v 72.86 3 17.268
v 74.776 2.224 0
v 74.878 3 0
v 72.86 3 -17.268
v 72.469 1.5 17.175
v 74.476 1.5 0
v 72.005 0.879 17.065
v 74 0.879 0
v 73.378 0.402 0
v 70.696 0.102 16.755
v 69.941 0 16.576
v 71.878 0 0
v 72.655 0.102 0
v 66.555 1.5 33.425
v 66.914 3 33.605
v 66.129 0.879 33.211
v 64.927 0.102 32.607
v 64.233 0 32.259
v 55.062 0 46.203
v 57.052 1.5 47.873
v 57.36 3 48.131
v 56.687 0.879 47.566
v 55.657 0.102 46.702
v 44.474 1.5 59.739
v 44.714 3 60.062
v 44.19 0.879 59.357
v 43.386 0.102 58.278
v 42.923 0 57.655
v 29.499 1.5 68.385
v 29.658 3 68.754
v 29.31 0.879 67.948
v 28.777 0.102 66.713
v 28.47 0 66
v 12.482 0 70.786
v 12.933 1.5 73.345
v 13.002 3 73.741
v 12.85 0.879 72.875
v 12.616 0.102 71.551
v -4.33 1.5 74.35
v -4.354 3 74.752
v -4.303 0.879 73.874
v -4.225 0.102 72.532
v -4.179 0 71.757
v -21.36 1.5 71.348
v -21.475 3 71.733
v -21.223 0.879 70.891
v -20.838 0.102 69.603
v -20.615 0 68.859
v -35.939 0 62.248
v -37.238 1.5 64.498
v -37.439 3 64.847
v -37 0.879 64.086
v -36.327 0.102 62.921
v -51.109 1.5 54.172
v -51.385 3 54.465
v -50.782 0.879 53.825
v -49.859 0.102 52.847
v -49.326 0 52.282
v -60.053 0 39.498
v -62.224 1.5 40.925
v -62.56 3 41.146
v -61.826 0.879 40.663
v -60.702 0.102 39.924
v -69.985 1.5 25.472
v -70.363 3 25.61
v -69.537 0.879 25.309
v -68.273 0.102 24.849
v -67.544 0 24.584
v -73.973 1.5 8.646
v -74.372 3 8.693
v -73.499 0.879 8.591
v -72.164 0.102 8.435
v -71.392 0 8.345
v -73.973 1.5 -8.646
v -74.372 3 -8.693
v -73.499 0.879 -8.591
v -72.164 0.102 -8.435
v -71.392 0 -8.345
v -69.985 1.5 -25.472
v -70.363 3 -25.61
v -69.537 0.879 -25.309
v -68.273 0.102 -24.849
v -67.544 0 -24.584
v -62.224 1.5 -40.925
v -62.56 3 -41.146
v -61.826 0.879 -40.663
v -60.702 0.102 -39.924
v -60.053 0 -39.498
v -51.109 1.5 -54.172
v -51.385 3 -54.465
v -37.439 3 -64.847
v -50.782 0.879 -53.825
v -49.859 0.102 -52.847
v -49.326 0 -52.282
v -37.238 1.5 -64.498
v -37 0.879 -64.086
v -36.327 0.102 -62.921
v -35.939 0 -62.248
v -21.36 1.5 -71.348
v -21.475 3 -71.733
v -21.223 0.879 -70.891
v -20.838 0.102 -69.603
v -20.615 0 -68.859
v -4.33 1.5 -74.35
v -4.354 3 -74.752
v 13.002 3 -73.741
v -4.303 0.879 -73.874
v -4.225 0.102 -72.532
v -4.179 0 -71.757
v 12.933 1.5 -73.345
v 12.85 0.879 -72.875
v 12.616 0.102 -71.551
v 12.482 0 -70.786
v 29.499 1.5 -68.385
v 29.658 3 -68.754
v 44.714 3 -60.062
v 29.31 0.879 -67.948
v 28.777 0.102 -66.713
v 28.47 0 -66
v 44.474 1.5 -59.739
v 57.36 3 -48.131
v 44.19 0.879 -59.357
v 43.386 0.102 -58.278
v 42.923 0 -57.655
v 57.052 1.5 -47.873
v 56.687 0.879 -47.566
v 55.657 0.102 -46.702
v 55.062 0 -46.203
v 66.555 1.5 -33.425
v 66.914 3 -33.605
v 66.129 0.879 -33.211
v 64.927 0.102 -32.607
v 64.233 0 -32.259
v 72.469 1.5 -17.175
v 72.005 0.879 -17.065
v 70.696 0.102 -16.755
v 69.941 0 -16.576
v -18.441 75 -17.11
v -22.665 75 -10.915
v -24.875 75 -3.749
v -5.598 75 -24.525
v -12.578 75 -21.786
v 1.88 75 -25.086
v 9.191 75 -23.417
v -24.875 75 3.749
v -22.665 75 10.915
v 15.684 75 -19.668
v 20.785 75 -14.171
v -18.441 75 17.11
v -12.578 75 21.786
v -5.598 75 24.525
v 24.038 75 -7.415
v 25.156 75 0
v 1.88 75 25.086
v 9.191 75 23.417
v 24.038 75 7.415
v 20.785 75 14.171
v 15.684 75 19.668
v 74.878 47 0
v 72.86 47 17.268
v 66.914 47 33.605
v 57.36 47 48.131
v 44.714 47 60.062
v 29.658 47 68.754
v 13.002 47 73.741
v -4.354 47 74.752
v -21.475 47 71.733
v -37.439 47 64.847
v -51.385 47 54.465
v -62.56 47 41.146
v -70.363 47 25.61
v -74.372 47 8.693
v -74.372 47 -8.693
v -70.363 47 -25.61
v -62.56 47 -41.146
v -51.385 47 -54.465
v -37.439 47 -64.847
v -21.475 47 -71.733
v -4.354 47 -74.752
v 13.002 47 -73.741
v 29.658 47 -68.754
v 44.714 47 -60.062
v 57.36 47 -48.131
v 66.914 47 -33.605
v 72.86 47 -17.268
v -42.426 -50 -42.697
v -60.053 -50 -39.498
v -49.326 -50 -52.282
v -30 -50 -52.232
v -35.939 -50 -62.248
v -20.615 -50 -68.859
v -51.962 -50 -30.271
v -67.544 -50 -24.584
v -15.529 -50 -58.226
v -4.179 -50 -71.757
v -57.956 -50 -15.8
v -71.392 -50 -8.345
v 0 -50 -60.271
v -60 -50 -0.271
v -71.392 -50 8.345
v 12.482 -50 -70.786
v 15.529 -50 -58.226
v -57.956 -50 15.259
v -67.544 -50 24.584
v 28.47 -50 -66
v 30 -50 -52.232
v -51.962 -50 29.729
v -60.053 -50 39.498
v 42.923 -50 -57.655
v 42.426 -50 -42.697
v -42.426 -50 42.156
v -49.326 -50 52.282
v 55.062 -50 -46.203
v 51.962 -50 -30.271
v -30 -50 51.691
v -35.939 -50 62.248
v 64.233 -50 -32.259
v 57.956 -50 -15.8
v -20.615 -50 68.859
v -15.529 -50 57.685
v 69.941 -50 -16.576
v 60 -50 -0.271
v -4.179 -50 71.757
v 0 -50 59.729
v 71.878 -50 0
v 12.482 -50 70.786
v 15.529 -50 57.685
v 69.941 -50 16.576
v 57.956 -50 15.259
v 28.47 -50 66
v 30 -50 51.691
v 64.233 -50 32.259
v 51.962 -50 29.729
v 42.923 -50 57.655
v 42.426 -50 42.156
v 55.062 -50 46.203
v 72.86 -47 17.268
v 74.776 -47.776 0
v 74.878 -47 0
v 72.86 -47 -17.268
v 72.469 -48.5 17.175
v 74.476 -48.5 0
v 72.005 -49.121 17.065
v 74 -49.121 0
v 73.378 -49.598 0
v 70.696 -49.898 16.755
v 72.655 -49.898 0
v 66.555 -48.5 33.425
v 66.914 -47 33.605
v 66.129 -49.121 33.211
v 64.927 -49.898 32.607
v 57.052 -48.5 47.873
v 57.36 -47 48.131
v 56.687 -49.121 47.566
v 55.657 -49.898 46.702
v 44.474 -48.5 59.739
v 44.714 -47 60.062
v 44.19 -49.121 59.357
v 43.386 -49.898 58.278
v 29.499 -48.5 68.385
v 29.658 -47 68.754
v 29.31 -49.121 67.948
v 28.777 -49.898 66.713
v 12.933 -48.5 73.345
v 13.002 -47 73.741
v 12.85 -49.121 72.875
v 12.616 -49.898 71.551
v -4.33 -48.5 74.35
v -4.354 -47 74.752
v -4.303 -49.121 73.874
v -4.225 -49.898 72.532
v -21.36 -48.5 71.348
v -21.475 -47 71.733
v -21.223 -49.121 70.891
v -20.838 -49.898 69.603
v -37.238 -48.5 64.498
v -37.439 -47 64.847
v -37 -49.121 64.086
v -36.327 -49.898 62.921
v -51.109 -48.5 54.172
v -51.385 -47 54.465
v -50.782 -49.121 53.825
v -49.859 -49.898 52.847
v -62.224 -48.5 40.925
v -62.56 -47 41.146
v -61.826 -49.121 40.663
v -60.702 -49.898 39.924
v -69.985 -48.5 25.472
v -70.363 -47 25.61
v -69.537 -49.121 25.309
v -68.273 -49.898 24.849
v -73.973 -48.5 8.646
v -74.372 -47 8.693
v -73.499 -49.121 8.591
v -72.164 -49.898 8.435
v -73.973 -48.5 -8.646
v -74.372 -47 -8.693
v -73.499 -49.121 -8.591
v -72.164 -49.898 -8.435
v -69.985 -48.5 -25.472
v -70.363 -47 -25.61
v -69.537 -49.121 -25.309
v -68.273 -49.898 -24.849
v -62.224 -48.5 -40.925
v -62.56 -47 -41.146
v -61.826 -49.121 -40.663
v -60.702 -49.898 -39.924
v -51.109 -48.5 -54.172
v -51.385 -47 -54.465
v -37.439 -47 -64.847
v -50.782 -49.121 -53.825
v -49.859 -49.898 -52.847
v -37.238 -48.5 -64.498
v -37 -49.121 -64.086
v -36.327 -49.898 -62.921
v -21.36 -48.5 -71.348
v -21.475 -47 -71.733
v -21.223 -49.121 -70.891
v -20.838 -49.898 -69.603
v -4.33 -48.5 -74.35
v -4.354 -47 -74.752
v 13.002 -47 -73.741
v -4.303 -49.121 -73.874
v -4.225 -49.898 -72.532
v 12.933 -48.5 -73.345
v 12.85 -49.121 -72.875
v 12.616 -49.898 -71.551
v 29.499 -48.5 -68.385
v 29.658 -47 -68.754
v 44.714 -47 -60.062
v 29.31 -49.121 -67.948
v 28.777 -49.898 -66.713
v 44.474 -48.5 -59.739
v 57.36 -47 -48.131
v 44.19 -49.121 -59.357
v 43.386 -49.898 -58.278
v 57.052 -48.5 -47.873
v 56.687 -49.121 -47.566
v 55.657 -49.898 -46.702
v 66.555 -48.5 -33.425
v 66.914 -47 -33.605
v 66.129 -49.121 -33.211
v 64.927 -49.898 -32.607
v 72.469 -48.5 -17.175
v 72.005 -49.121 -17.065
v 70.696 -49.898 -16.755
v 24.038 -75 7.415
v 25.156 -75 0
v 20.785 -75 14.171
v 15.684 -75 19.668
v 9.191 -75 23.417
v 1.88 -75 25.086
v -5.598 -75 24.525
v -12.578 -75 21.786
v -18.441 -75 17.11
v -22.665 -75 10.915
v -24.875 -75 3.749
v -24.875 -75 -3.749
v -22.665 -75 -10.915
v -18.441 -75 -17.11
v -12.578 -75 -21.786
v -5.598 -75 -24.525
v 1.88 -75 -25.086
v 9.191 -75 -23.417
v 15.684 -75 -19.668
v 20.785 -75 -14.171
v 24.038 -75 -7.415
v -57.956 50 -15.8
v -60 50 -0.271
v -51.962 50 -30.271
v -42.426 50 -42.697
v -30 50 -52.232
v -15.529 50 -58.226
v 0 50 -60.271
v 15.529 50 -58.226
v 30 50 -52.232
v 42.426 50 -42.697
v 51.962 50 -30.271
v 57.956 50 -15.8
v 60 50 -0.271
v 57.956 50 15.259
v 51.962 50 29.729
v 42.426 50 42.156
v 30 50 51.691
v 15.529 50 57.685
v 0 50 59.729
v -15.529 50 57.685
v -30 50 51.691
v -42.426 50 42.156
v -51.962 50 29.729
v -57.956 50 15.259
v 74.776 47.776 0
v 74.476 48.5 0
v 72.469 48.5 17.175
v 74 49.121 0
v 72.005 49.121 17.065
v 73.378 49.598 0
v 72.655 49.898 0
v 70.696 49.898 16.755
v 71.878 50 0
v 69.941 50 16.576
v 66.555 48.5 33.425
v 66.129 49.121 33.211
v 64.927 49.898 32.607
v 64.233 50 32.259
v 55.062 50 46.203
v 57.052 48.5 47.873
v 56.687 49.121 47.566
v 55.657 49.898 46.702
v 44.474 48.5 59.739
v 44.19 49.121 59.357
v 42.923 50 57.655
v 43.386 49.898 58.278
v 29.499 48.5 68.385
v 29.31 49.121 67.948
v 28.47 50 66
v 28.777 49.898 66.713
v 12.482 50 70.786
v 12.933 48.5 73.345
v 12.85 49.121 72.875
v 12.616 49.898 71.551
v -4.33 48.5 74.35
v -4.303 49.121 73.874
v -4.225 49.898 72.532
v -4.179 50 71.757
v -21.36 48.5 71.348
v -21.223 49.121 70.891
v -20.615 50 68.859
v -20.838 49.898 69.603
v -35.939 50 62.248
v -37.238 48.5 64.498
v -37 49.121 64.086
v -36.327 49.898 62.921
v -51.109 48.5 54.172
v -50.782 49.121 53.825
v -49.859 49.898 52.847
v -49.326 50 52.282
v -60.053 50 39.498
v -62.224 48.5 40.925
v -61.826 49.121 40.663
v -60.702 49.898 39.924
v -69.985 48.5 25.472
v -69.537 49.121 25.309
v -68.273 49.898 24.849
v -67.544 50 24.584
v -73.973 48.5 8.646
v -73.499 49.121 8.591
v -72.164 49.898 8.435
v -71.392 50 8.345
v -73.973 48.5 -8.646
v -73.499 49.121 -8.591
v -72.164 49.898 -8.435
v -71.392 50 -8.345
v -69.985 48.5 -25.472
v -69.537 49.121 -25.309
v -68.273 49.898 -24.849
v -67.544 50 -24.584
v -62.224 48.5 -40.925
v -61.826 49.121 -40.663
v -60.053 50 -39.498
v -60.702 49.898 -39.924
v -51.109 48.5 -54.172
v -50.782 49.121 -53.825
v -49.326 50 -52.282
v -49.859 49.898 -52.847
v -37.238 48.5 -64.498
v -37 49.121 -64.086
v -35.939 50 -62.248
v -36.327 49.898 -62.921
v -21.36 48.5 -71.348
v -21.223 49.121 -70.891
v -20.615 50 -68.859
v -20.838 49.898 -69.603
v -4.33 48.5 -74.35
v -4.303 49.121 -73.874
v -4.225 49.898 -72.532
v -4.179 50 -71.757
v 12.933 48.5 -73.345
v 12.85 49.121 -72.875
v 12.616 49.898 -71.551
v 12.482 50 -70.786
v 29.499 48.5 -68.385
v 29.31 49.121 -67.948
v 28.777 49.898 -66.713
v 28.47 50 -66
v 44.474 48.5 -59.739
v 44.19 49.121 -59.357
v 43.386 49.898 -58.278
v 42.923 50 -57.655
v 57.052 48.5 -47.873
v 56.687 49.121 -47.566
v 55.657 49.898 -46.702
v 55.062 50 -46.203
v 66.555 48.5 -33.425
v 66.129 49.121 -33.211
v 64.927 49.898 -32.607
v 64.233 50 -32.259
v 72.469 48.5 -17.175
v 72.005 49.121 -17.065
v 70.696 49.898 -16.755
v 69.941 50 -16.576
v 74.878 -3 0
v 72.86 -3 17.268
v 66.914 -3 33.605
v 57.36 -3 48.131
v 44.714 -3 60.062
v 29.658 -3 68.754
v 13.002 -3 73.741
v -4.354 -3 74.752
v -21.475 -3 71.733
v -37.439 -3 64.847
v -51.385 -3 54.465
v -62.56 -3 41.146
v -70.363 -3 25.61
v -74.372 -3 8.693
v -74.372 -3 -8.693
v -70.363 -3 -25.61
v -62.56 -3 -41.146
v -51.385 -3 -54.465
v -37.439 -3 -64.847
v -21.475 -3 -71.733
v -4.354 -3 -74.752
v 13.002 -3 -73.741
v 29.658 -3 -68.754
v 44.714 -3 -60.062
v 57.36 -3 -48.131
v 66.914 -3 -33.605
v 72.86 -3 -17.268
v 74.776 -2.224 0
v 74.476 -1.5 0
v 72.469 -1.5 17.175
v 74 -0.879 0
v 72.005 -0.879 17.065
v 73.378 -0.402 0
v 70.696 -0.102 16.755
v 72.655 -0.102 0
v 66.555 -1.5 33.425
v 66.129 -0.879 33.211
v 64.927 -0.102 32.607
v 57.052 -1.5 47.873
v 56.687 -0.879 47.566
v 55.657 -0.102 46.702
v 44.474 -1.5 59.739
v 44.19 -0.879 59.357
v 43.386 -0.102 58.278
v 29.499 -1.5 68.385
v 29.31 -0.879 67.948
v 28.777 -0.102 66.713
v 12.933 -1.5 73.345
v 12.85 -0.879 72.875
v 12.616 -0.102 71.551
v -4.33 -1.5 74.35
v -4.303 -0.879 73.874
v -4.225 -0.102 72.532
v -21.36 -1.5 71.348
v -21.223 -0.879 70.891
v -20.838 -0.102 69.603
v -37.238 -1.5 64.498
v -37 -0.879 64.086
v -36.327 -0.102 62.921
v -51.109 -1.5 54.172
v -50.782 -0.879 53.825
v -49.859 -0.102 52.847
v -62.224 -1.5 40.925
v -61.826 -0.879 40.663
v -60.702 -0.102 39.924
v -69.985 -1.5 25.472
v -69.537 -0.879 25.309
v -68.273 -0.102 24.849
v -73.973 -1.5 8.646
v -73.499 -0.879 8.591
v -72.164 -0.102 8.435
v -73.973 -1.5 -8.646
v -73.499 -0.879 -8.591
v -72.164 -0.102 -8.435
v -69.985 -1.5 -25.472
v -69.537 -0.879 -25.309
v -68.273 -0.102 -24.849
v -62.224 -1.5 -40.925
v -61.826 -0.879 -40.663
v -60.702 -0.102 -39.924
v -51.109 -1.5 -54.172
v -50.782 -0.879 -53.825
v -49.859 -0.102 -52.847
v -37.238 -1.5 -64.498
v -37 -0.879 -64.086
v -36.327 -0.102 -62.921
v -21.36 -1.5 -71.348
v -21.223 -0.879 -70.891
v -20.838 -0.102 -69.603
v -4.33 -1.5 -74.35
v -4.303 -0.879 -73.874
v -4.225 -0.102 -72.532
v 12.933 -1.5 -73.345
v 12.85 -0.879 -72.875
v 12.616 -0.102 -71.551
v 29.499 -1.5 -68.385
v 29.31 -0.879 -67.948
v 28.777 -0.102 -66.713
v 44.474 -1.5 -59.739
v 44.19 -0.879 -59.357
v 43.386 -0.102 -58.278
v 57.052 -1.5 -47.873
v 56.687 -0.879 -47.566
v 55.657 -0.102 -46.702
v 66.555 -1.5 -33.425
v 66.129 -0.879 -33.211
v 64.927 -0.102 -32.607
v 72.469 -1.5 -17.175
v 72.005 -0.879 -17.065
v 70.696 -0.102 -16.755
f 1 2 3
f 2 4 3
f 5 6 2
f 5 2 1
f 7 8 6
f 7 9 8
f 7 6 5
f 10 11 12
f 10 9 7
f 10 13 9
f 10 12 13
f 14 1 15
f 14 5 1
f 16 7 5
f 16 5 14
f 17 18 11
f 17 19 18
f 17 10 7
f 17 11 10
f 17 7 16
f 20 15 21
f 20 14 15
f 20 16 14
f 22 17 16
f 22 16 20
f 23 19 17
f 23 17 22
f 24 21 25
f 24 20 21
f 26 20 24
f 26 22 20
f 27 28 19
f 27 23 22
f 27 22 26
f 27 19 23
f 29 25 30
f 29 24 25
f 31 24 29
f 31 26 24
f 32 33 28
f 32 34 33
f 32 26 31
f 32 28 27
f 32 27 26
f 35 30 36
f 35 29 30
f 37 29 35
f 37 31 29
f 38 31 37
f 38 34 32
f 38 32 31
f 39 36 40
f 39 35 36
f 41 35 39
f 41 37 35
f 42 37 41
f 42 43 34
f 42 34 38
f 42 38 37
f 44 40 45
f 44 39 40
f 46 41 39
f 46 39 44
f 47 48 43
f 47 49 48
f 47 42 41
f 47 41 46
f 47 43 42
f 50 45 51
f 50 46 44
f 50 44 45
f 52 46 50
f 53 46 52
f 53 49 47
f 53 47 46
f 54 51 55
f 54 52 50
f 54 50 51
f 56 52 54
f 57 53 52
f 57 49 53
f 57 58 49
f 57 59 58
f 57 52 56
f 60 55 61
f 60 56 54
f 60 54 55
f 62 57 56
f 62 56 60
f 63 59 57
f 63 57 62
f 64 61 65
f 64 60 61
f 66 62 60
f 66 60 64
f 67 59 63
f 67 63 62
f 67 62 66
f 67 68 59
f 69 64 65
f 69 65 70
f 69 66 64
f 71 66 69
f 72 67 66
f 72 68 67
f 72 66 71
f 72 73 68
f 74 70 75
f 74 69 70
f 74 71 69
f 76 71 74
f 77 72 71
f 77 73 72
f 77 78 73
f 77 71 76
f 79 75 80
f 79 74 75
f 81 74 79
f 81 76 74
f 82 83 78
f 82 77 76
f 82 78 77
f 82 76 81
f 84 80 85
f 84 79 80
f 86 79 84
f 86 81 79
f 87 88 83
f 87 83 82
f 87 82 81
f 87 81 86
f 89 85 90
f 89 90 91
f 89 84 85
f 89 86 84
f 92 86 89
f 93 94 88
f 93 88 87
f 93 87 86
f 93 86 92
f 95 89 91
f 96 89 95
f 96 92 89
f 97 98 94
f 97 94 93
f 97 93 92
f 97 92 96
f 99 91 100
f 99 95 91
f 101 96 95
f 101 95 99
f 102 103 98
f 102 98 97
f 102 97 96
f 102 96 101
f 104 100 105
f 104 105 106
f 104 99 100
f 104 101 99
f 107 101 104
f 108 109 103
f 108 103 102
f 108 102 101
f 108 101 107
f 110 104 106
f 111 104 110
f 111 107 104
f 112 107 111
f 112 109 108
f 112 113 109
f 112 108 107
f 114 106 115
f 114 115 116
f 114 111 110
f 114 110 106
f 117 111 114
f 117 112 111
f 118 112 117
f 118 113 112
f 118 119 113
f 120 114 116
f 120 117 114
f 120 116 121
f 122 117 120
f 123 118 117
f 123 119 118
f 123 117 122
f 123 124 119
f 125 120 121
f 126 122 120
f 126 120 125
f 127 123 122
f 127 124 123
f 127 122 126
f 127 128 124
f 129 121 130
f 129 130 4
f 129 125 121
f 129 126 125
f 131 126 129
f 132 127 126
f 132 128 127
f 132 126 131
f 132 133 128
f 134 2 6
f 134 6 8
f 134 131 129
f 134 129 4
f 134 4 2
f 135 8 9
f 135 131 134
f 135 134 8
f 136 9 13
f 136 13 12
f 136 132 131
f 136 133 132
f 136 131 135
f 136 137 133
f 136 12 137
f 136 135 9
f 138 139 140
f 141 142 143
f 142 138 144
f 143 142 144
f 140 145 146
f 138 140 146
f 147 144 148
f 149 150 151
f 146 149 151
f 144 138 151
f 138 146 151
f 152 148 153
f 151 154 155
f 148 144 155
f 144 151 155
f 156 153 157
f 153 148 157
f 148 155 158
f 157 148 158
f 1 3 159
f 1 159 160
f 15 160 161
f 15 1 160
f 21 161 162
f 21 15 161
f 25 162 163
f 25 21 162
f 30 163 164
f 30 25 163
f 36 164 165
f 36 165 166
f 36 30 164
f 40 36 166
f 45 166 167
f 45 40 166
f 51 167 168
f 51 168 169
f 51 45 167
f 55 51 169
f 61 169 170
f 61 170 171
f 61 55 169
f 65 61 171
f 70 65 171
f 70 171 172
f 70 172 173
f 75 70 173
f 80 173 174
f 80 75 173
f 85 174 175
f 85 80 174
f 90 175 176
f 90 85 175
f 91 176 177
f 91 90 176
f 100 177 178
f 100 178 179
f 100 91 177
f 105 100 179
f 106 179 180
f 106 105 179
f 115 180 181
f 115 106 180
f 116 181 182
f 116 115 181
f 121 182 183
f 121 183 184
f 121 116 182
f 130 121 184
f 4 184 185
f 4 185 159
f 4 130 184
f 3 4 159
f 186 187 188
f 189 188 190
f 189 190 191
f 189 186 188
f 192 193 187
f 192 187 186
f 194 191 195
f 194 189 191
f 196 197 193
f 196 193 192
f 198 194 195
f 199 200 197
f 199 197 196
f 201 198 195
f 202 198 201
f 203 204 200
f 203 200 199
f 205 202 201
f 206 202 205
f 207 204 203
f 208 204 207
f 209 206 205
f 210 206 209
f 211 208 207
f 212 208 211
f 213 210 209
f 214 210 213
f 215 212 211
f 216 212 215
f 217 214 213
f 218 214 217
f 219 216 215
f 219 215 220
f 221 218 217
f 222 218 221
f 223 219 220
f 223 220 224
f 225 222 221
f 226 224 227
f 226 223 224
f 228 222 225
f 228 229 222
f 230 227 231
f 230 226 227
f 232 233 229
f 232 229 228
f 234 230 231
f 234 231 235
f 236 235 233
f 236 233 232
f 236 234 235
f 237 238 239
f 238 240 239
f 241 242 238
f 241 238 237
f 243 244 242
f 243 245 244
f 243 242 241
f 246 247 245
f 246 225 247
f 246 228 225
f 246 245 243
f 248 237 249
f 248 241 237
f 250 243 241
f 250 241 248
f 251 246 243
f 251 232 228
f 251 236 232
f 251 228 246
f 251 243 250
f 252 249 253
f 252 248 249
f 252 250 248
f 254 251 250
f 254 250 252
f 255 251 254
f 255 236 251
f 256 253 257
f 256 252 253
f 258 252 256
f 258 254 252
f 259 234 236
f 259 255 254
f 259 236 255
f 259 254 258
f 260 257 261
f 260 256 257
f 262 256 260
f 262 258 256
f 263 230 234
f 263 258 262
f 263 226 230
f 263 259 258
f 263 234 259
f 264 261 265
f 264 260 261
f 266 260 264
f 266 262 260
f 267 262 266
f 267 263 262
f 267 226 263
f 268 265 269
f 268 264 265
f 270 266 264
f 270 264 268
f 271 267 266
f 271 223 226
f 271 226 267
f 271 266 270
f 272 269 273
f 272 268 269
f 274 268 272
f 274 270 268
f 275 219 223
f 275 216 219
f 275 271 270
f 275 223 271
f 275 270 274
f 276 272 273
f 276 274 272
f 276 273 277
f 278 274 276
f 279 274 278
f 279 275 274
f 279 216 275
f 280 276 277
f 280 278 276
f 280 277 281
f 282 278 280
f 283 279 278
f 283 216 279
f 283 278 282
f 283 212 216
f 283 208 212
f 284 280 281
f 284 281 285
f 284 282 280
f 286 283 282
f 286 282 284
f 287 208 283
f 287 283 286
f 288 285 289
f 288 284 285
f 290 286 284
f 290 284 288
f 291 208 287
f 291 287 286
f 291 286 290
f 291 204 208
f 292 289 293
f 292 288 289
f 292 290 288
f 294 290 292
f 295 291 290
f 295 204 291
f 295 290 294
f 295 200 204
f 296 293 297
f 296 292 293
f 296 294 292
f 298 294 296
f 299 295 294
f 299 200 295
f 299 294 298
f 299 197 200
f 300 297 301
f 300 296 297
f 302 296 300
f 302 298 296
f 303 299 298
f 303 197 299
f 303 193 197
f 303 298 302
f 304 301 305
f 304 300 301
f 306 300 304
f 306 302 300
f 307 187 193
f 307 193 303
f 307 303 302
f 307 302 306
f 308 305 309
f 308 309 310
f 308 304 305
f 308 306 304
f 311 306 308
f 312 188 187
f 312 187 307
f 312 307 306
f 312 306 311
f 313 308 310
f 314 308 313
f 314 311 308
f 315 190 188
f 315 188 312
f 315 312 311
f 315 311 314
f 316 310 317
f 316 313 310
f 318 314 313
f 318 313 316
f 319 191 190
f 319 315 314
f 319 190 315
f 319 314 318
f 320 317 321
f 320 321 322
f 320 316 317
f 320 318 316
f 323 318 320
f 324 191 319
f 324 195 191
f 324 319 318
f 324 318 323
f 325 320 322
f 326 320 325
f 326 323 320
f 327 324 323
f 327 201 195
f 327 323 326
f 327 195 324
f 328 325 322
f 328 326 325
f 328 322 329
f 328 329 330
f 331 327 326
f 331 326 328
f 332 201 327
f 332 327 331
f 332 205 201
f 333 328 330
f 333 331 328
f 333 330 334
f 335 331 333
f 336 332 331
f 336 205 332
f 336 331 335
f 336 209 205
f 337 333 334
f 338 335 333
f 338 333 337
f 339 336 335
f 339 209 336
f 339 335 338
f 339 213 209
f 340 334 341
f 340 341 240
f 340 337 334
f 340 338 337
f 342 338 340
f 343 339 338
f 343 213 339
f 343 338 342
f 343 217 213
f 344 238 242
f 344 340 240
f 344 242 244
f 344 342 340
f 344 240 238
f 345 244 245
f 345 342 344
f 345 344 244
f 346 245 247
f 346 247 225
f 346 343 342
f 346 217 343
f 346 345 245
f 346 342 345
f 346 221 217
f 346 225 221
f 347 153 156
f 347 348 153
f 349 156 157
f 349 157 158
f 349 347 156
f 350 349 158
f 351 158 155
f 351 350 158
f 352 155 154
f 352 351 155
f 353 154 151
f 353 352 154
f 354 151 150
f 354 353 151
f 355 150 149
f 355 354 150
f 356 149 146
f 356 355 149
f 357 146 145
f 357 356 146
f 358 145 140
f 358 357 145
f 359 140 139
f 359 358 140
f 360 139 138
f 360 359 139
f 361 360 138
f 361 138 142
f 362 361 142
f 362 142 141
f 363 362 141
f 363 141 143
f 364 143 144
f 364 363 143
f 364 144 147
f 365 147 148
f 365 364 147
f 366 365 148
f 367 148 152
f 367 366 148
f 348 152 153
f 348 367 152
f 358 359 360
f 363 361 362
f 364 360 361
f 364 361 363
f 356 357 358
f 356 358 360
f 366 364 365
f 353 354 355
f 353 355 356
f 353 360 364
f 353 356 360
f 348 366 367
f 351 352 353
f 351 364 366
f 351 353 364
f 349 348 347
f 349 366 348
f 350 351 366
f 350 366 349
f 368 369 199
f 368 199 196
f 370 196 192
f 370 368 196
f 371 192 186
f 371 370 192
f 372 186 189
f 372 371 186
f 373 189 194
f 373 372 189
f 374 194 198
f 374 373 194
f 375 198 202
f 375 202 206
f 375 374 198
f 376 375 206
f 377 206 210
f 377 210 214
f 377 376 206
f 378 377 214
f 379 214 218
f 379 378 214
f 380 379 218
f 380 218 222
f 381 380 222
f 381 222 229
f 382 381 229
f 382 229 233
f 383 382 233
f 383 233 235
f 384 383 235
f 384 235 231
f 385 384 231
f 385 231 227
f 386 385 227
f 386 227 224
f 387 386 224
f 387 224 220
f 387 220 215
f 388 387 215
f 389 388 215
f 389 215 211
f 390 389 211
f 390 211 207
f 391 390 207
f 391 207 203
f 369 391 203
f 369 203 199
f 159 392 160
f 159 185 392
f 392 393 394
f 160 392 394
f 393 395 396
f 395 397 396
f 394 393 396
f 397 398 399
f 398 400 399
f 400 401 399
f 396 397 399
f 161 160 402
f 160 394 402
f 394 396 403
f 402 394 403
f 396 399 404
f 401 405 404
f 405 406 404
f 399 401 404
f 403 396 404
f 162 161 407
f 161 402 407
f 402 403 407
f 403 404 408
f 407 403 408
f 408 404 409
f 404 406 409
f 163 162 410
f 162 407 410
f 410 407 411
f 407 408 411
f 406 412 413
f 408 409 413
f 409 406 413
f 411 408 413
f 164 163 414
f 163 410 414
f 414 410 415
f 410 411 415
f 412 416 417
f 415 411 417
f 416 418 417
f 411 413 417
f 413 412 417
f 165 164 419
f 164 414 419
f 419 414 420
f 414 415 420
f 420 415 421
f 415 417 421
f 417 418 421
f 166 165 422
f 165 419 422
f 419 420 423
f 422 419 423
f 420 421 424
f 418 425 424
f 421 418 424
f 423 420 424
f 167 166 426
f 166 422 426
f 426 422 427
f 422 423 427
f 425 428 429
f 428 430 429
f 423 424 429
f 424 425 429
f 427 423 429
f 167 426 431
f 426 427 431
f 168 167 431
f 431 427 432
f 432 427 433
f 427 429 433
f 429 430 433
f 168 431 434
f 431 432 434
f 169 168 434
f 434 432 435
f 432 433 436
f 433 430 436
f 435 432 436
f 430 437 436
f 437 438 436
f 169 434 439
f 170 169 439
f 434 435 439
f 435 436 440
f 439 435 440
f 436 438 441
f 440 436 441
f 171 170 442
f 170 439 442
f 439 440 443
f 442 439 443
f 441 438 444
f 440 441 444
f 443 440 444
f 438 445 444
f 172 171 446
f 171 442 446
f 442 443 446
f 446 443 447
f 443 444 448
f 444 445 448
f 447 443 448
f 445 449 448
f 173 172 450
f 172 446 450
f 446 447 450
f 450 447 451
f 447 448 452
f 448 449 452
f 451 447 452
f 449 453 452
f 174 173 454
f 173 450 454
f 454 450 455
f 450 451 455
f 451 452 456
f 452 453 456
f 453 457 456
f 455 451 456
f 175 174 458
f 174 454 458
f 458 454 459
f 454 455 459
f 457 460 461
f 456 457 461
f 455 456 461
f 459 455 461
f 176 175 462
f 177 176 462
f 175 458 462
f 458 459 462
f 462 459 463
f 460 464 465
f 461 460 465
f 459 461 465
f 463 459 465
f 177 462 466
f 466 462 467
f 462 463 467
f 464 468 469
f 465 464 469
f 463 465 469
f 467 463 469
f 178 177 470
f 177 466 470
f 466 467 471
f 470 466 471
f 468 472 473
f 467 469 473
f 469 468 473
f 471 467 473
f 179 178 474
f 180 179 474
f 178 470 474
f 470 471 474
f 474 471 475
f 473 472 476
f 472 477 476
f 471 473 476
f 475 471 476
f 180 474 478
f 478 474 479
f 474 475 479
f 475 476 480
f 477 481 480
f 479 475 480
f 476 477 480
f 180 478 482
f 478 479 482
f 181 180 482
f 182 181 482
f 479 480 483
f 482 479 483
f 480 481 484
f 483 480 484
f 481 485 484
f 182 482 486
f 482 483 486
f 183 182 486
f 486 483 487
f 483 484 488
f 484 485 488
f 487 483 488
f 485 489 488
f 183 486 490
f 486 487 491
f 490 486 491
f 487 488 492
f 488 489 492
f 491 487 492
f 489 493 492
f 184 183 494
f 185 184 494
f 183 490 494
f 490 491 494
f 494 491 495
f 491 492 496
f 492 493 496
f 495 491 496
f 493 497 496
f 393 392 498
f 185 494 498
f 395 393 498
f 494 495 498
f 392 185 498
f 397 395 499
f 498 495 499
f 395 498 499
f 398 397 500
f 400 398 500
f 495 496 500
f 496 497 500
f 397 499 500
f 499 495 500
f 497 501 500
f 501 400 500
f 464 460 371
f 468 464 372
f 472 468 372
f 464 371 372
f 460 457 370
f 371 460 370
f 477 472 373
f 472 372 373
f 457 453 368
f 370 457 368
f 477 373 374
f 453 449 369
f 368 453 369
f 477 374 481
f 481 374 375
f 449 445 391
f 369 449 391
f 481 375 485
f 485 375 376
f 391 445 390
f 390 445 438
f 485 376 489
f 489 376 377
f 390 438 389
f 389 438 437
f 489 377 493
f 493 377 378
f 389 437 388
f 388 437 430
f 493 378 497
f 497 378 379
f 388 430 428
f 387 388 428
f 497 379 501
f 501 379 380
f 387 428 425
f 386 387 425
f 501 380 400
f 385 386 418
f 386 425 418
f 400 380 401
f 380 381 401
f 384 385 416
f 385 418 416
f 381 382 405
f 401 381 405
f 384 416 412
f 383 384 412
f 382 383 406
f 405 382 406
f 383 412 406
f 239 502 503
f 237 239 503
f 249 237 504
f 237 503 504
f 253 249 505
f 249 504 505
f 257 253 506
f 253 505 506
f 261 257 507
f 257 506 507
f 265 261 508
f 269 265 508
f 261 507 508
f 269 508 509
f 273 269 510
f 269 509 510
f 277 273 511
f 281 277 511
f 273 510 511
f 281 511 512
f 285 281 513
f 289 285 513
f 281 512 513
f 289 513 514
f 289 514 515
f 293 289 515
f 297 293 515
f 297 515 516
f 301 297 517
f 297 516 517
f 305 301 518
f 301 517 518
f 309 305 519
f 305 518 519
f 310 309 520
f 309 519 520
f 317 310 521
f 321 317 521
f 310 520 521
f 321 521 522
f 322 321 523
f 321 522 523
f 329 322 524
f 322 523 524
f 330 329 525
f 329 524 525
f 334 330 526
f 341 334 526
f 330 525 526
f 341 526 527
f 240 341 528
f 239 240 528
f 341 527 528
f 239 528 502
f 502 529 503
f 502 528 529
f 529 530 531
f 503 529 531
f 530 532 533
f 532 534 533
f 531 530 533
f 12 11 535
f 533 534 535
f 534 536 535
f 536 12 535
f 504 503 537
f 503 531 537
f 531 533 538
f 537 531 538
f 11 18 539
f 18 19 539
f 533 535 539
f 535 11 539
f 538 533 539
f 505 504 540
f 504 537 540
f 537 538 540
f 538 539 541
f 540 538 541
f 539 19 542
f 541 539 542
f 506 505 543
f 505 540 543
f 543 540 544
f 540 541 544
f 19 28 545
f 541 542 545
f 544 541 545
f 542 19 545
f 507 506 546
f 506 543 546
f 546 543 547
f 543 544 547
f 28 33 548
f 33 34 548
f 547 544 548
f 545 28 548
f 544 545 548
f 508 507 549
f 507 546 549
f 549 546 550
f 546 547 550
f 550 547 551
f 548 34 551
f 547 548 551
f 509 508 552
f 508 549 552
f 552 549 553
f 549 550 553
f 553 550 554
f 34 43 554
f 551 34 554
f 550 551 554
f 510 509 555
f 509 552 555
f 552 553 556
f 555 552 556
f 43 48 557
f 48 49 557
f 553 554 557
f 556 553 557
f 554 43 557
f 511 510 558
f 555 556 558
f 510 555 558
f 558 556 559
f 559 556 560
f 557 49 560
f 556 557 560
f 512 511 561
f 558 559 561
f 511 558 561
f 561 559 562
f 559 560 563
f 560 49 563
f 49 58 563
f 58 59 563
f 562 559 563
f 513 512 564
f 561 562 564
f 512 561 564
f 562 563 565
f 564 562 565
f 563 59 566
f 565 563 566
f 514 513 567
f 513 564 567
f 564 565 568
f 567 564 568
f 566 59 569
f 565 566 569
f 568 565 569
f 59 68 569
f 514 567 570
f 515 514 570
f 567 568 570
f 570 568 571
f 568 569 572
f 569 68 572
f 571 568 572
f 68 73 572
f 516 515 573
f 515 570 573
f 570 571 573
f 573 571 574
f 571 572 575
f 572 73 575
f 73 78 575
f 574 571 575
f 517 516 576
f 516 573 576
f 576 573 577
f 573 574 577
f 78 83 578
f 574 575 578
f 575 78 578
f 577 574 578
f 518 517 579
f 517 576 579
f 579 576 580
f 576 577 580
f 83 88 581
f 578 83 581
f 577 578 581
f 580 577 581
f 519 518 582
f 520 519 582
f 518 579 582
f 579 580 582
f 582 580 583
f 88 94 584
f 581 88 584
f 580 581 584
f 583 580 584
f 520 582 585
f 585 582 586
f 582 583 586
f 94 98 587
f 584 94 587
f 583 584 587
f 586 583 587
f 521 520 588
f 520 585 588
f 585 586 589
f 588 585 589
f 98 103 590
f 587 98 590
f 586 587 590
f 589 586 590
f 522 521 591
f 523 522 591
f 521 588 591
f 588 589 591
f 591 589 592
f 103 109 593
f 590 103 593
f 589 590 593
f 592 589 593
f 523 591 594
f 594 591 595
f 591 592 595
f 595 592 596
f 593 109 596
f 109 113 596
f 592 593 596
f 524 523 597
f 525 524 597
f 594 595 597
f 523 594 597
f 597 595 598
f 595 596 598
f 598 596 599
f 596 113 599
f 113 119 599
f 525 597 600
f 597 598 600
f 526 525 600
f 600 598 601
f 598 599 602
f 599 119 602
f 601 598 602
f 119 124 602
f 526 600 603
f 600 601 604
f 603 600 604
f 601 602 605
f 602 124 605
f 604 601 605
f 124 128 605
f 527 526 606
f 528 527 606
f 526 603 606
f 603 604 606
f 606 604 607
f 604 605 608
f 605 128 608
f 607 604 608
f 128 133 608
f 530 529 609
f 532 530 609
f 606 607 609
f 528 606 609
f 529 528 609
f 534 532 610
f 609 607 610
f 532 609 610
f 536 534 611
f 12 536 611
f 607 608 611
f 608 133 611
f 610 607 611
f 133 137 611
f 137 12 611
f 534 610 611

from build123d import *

# Parameters (mm, degrees)
F0_R     = 74.8783311707
F1_DEPTH = 50
F3_D     = 120
F4_R     = 3
F6_R     = 25.1559486601
F7_DEPTH = 75


with BuildPart() as f1:
    # F0 (on Front) → F1 (new body)
    with BuildSketch(Plane.XZ):
        Circle(F0_R)
    extrude(amount=F1_DEPTH)

    # F3 (through all)
    with Locations(Plane(origin=(0, 0, 0), x_dir=(1, 0, 0), z_dir=(0, 1, 0))):
        with Locations((0, 0.2706199884)):
            Hole(F3_D / 2)

    # F4
    f4_edges = [f1.edges().sort_by_distance(p)[0] for p in [
        (-74.878331, -50, 0),
        (-74.878331, 0, 0),
    ]]
    fillet(f4_edges, radius=F4_R)

    # F5: F1 across plane


with BuildPart() as f1_1:
    add(f1.part)
    add(f1.part.mirror(Plane.XZ))


with BuildPart() as f7:
    # F6 (on Front) → F7 (new body, symmetric)
    with BuildSketch(Plane.XZ):
        Circle(F6_R)
    extrude(amount=F7_DEPTH, both=True)


solid = Compound([f1_1.part, f7.part])
